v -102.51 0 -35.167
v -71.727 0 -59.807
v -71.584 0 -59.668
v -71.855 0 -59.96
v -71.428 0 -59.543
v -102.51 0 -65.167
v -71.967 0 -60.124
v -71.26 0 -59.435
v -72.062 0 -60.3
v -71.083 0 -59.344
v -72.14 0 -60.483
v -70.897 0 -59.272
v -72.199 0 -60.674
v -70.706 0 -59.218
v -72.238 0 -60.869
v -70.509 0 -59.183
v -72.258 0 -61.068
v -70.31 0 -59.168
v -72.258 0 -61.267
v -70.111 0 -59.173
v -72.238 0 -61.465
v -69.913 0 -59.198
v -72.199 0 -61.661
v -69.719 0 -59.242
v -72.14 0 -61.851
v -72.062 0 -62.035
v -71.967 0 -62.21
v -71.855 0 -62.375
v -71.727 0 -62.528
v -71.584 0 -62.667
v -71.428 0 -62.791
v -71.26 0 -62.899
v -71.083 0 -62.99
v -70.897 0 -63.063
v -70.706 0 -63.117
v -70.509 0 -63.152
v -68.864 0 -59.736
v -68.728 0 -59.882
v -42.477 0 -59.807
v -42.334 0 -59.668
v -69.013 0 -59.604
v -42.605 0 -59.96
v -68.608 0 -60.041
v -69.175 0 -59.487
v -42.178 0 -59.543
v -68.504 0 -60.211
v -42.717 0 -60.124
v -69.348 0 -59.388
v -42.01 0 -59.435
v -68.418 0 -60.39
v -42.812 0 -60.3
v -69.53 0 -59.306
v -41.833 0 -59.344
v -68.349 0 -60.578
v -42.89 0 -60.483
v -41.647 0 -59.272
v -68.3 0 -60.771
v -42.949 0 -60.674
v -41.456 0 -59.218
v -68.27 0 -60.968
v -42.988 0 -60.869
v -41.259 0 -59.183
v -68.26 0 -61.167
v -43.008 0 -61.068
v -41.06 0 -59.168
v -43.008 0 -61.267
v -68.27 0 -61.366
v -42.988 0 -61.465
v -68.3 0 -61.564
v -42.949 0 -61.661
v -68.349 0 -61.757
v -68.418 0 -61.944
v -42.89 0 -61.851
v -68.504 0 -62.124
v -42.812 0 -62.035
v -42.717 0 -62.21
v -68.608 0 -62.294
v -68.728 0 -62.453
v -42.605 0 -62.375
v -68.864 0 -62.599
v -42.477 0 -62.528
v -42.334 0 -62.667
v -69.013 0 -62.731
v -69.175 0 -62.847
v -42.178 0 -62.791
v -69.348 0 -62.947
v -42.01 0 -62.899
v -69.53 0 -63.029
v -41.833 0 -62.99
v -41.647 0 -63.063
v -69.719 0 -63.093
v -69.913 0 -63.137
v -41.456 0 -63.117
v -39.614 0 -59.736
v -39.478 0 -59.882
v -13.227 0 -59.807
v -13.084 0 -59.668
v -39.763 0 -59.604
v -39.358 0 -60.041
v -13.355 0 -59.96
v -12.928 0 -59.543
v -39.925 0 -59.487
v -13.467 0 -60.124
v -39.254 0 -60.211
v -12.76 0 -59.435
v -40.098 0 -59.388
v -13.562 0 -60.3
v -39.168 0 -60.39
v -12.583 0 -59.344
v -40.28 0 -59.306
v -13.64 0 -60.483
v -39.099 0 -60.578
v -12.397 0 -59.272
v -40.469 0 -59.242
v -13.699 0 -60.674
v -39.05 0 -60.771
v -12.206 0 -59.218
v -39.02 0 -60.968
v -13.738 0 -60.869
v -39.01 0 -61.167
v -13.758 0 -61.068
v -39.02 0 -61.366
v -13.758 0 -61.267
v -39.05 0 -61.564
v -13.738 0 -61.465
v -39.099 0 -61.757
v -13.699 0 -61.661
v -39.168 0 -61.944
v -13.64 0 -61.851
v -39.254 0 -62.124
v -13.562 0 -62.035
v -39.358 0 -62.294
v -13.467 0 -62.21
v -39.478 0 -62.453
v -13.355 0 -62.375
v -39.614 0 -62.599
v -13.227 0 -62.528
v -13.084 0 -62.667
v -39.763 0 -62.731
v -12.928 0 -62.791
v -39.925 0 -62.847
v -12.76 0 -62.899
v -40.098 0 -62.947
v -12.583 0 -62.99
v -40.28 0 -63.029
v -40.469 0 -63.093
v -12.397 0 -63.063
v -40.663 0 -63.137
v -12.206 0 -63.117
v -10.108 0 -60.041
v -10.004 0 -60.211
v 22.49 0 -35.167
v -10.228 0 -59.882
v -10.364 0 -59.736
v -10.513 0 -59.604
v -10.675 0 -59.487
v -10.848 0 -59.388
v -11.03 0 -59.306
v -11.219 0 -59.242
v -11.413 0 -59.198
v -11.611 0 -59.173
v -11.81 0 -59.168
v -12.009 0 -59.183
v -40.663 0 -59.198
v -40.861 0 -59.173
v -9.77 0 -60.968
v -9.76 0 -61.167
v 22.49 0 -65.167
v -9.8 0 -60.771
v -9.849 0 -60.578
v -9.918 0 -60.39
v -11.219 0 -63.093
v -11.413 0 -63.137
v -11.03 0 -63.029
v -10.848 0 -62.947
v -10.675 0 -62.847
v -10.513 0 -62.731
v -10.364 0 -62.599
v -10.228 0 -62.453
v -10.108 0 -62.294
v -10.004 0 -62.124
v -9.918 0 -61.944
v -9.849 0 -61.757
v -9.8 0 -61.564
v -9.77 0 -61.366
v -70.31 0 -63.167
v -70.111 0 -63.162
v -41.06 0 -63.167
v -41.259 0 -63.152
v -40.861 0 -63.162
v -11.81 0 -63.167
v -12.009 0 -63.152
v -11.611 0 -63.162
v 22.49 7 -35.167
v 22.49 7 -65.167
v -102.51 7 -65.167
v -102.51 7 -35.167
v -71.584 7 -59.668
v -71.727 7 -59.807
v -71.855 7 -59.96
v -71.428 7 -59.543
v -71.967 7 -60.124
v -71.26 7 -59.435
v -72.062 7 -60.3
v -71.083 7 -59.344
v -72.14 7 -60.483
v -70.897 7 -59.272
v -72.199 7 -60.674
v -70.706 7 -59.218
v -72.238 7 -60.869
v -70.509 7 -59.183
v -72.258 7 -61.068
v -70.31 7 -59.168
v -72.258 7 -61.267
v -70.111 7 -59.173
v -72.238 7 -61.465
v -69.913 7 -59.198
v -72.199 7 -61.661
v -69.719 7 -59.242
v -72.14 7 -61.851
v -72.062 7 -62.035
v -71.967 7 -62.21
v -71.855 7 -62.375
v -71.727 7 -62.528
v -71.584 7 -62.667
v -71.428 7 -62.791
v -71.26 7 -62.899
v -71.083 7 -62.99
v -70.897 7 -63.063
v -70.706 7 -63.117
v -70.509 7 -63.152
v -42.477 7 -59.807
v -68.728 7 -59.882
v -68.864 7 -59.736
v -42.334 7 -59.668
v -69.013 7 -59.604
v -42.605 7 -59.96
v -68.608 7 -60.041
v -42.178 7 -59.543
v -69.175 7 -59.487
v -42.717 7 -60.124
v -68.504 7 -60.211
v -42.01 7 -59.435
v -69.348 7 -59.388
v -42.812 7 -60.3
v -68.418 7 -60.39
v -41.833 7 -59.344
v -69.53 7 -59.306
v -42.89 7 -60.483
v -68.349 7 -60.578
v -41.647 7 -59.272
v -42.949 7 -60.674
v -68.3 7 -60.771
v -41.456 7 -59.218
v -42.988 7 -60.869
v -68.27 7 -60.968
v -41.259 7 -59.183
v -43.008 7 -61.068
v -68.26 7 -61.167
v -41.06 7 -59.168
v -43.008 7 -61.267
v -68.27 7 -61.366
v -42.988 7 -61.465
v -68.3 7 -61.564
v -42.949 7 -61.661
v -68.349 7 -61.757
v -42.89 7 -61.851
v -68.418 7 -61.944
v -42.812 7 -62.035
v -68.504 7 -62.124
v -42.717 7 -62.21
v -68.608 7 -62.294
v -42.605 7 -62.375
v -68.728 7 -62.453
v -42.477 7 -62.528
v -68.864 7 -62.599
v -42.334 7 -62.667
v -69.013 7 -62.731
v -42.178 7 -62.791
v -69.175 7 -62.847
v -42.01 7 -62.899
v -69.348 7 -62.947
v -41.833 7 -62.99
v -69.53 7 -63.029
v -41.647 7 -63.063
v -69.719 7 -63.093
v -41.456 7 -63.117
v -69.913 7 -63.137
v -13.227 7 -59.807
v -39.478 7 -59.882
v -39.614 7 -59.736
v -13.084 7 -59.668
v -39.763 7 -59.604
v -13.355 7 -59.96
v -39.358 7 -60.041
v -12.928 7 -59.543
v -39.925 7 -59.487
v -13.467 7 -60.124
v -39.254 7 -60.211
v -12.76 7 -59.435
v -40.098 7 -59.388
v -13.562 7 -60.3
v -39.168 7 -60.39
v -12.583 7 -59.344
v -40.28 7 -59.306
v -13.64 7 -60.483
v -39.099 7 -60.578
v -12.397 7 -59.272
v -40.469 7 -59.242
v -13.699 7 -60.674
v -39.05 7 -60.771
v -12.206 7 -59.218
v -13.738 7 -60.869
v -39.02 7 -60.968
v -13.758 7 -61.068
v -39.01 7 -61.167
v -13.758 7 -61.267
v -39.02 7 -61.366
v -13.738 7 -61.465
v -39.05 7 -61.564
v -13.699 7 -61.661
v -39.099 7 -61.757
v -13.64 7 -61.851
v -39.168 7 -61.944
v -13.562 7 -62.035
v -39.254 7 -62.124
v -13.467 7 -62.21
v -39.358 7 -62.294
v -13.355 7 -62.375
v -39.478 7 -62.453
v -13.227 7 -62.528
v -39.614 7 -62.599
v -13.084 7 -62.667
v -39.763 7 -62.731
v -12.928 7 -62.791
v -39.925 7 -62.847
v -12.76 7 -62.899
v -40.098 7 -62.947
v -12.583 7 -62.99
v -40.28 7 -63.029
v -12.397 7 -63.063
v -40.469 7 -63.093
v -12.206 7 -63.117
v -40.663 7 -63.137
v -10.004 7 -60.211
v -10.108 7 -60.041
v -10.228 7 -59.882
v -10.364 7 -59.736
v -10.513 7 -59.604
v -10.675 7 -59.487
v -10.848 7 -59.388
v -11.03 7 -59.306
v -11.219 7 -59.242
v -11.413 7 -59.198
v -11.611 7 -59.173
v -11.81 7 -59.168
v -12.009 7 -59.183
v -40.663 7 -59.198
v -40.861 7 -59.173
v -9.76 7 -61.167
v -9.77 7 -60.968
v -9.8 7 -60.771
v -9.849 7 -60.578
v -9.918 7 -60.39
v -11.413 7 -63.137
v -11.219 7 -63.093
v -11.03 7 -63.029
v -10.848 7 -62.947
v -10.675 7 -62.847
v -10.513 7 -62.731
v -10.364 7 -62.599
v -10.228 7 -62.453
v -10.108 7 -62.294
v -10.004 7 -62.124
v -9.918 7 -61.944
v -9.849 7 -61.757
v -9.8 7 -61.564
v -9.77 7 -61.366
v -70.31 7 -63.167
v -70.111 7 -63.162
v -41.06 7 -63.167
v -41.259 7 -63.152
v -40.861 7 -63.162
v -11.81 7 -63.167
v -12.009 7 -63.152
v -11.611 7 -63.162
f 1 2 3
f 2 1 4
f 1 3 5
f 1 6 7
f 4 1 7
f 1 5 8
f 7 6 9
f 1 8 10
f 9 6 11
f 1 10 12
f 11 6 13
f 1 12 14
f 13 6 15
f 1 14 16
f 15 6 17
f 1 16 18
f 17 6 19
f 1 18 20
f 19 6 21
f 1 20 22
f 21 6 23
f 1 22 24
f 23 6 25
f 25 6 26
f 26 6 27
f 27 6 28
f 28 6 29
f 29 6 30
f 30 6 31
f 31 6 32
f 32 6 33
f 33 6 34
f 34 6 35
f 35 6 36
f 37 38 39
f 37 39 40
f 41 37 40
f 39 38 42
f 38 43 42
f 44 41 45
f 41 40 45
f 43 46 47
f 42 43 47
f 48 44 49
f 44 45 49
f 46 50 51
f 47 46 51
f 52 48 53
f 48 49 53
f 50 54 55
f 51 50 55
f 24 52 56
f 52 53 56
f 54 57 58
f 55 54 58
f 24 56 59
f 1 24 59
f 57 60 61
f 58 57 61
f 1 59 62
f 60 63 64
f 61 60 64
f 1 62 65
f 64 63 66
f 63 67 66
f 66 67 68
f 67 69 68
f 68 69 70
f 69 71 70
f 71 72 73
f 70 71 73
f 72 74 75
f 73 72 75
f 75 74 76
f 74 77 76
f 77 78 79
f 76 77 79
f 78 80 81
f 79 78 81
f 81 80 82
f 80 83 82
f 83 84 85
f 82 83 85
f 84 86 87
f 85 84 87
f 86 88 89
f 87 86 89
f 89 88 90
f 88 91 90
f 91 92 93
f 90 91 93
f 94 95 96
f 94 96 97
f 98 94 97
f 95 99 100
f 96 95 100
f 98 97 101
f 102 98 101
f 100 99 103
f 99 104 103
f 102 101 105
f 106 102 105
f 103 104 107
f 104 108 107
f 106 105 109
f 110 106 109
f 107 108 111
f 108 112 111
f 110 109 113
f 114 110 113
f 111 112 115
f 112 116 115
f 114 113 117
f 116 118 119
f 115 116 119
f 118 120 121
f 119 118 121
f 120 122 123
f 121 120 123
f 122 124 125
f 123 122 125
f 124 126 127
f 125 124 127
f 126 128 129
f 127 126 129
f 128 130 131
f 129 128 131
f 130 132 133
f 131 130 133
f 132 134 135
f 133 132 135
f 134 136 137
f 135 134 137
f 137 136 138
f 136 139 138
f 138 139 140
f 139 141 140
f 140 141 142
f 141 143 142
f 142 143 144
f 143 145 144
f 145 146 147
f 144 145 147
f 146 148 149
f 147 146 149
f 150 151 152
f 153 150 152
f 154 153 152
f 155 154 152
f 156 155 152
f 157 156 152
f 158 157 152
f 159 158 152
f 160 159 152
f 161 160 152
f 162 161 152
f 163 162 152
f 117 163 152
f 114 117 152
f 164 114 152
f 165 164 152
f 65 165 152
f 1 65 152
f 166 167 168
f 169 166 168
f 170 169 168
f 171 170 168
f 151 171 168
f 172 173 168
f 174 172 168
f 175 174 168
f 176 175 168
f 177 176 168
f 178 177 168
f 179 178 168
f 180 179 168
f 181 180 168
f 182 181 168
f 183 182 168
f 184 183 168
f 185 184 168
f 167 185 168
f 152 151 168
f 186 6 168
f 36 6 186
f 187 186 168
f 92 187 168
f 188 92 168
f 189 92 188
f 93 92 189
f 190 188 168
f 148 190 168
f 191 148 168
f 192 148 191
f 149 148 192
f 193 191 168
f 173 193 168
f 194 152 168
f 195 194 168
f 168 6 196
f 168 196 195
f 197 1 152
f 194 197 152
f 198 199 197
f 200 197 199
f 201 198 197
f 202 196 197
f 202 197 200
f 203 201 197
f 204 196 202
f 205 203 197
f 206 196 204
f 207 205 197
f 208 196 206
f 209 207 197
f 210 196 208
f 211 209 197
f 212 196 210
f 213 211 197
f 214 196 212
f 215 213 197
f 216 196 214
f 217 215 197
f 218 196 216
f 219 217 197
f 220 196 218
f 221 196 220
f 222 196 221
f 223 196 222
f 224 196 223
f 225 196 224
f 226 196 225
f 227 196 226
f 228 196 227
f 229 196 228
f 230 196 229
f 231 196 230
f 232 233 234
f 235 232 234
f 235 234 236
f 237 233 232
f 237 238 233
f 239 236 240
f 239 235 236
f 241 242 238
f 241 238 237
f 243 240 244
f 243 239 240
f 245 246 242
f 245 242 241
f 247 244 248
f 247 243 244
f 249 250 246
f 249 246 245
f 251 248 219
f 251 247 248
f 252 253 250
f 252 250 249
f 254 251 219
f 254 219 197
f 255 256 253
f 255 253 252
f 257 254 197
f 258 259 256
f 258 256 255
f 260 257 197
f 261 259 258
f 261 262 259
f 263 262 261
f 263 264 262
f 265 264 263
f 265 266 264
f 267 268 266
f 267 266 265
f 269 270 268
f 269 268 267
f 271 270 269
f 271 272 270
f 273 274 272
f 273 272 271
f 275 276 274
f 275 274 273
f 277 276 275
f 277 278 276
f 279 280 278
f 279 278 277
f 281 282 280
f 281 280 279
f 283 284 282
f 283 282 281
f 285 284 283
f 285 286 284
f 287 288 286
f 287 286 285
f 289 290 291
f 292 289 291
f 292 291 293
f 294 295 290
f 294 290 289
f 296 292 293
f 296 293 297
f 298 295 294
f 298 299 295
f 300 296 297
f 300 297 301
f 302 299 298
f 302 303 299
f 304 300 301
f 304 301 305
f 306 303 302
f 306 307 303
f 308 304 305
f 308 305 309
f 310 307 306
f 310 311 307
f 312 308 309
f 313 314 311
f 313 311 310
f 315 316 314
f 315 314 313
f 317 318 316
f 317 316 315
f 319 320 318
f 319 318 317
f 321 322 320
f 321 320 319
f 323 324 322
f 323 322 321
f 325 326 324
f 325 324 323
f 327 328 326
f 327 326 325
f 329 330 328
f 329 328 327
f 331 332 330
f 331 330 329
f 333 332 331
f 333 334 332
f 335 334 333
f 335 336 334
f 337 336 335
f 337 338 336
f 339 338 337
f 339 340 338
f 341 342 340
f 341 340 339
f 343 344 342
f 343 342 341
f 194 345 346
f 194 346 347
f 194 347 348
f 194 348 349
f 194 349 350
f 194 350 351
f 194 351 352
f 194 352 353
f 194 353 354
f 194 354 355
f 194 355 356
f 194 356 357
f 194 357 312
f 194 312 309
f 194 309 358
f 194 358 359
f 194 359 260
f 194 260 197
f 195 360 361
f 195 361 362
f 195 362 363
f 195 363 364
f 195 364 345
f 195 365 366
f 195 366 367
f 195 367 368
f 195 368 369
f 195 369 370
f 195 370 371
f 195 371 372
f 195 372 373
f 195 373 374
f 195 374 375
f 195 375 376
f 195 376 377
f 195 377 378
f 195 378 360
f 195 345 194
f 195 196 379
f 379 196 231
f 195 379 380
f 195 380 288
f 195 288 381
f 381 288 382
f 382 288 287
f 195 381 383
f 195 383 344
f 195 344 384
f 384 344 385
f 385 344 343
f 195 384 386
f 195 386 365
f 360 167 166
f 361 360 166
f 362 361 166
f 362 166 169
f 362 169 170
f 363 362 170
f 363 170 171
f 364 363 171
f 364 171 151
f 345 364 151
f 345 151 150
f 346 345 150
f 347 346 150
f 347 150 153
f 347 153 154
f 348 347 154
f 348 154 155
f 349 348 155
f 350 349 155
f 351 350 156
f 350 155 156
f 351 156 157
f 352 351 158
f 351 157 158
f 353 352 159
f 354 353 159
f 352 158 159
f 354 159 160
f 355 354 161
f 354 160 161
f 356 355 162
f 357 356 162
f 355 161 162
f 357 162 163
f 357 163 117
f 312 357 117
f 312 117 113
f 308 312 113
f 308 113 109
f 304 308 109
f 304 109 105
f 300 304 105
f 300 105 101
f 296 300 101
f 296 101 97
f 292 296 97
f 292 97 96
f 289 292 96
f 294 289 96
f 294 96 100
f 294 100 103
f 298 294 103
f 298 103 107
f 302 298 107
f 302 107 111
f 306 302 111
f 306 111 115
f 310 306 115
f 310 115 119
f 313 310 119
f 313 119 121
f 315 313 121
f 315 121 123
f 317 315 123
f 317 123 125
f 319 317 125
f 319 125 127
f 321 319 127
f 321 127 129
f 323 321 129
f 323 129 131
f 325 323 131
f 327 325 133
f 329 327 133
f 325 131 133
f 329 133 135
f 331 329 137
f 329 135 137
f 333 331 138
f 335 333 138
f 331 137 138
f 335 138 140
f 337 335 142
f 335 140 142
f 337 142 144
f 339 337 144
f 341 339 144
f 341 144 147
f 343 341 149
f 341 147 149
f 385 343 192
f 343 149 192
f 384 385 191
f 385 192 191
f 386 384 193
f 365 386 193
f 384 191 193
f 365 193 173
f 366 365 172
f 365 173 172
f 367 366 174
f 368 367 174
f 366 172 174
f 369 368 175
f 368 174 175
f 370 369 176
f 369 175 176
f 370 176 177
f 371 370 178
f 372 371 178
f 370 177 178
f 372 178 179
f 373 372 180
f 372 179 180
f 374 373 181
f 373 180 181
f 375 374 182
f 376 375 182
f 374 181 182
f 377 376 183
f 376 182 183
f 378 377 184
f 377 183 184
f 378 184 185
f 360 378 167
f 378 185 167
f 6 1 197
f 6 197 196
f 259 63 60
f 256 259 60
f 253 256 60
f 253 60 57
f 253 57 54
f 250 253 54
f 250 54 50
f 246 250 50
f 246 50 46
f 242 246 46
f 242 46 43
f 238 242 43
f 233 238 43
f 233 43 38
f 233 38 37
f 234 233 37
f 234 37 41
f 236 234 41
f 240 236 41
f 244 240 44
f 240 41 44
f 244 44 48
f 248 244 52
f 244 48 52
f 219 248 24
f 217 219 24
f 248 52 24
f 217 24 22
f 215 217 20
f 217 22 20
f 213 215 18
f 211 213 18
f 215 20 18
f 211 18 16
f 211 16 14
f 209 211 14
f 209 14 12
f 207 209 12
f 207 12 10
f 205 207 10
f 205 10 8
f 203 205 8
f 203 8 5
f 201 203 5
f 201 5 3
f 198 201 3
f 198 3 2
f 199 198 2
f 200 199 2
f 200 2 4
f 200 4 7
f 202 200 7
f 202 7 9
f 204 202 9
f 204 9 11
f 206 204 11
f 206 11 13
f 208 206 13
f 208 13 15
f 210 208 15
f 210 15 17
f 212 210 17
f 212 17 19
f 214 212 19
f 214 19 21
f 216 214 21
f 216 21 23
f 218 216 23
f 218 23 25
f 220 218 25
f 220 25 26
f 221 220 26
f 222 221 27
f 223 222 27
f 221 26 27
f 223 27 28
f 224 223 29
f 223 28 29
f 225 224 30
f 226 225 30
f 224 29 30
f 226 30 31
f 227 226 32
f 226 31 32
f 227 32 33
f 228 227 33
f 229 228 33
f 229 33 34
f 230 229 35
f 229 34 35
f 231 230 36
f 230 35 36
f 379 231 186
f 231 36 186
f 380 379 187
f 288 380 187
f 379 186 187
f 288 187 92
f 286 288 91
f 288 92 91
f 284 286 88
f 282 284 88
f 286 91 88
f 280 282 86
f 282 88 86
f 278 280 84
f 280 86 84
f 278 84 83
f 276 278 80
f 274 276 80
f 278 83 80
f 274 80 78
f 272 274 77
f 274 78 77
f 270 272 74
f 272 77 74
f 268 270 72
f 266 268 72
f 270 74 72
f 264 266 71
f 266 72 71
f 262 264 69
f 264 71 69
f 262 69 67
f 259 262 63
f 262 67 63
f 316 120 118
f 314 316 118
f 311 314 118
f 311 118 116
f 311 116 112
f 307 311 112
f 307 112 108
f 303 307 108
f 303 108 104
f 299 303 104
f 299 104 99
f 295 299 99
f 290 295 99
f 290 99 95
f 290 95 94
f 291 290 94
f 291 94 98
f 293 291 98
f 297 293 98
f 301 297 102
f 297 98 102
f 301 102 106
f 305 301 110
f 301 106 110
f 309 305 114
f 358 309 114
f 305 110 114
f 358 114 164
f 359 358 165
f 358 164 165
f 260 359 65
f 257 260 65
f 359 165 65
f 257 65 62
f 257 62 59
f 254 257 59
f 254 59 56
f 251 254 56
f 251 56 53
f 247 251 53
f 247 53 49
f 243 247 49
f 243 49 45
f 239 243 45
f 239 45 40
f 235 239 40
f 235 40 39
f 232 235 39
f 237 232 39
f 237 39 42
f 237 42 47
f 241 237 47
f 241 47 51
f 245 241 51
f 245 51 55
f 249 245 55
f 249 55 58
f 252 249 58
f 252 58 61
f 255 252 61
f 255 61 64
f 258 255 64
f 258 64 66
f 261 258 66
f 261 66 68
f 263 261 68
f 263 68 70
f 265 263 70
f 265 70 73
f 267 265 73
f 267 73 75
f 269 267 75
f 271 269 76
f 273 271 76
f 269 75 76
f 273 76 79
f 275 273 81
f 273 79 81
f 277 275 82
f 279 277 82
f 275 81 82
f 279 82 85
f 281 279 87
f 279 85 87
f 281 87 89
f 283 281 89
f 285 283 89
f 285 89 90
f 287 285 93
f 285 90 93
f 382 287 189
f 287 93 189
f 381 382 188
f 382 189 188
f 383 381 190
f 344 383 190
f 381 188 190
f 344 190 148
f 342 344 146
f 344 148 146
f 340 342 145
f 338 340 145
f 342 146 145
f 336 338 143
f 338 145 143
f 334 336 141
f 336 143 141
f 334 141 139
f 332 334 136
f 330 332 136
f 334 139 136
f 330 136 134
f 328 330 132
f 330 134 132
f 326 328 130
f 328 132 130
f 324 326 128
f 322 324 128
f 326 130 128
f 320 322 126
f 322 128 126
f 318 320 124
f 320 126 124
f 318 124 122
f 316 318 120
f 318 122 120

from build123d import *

# Parameters (mm, degrees)
SKETCH1_W           = 125
SKETCH1_H           = 30
BOSS_EXTRUDE1_DEPTH = 7
SKETCH2_R           = 2
CUT_EXTRUDE1_DEPTH  = 10


with BuildPart() as part:
    # Sketch1 → Boss-Extrude1 (new body)
    with BuildSketch(Plane(origin=(0, 0, 0), x_dir=(1, 0, 0), z_dir=(0, 1, 0))):
        with Locations((-40.010460251, 50.167364017)):
            Rectangle(SKETCH1_W, SKETCH1_H)
    extrude(amount=BOSS_EXTRUDE1_DEPTH)

    # Sketch2 → Cut-Extrude1 (cut)
    with BuildSketch(Plane.XZ):
        with Locations((-70.260460251, -61.167364017)):
            Circle(SKETCH2_R)
        with Locations((-41.010460251, -61.167364017)):
            Circle(SKETCH2_R)
        with Locations((-11.760460251, -61.167364017)):
            Circle(SKETCH2_R)
    extrude(amount=-CUT_EXTRUDE1_DEPTH, mode=Mode.SUBTRACT)


solid = part.part
